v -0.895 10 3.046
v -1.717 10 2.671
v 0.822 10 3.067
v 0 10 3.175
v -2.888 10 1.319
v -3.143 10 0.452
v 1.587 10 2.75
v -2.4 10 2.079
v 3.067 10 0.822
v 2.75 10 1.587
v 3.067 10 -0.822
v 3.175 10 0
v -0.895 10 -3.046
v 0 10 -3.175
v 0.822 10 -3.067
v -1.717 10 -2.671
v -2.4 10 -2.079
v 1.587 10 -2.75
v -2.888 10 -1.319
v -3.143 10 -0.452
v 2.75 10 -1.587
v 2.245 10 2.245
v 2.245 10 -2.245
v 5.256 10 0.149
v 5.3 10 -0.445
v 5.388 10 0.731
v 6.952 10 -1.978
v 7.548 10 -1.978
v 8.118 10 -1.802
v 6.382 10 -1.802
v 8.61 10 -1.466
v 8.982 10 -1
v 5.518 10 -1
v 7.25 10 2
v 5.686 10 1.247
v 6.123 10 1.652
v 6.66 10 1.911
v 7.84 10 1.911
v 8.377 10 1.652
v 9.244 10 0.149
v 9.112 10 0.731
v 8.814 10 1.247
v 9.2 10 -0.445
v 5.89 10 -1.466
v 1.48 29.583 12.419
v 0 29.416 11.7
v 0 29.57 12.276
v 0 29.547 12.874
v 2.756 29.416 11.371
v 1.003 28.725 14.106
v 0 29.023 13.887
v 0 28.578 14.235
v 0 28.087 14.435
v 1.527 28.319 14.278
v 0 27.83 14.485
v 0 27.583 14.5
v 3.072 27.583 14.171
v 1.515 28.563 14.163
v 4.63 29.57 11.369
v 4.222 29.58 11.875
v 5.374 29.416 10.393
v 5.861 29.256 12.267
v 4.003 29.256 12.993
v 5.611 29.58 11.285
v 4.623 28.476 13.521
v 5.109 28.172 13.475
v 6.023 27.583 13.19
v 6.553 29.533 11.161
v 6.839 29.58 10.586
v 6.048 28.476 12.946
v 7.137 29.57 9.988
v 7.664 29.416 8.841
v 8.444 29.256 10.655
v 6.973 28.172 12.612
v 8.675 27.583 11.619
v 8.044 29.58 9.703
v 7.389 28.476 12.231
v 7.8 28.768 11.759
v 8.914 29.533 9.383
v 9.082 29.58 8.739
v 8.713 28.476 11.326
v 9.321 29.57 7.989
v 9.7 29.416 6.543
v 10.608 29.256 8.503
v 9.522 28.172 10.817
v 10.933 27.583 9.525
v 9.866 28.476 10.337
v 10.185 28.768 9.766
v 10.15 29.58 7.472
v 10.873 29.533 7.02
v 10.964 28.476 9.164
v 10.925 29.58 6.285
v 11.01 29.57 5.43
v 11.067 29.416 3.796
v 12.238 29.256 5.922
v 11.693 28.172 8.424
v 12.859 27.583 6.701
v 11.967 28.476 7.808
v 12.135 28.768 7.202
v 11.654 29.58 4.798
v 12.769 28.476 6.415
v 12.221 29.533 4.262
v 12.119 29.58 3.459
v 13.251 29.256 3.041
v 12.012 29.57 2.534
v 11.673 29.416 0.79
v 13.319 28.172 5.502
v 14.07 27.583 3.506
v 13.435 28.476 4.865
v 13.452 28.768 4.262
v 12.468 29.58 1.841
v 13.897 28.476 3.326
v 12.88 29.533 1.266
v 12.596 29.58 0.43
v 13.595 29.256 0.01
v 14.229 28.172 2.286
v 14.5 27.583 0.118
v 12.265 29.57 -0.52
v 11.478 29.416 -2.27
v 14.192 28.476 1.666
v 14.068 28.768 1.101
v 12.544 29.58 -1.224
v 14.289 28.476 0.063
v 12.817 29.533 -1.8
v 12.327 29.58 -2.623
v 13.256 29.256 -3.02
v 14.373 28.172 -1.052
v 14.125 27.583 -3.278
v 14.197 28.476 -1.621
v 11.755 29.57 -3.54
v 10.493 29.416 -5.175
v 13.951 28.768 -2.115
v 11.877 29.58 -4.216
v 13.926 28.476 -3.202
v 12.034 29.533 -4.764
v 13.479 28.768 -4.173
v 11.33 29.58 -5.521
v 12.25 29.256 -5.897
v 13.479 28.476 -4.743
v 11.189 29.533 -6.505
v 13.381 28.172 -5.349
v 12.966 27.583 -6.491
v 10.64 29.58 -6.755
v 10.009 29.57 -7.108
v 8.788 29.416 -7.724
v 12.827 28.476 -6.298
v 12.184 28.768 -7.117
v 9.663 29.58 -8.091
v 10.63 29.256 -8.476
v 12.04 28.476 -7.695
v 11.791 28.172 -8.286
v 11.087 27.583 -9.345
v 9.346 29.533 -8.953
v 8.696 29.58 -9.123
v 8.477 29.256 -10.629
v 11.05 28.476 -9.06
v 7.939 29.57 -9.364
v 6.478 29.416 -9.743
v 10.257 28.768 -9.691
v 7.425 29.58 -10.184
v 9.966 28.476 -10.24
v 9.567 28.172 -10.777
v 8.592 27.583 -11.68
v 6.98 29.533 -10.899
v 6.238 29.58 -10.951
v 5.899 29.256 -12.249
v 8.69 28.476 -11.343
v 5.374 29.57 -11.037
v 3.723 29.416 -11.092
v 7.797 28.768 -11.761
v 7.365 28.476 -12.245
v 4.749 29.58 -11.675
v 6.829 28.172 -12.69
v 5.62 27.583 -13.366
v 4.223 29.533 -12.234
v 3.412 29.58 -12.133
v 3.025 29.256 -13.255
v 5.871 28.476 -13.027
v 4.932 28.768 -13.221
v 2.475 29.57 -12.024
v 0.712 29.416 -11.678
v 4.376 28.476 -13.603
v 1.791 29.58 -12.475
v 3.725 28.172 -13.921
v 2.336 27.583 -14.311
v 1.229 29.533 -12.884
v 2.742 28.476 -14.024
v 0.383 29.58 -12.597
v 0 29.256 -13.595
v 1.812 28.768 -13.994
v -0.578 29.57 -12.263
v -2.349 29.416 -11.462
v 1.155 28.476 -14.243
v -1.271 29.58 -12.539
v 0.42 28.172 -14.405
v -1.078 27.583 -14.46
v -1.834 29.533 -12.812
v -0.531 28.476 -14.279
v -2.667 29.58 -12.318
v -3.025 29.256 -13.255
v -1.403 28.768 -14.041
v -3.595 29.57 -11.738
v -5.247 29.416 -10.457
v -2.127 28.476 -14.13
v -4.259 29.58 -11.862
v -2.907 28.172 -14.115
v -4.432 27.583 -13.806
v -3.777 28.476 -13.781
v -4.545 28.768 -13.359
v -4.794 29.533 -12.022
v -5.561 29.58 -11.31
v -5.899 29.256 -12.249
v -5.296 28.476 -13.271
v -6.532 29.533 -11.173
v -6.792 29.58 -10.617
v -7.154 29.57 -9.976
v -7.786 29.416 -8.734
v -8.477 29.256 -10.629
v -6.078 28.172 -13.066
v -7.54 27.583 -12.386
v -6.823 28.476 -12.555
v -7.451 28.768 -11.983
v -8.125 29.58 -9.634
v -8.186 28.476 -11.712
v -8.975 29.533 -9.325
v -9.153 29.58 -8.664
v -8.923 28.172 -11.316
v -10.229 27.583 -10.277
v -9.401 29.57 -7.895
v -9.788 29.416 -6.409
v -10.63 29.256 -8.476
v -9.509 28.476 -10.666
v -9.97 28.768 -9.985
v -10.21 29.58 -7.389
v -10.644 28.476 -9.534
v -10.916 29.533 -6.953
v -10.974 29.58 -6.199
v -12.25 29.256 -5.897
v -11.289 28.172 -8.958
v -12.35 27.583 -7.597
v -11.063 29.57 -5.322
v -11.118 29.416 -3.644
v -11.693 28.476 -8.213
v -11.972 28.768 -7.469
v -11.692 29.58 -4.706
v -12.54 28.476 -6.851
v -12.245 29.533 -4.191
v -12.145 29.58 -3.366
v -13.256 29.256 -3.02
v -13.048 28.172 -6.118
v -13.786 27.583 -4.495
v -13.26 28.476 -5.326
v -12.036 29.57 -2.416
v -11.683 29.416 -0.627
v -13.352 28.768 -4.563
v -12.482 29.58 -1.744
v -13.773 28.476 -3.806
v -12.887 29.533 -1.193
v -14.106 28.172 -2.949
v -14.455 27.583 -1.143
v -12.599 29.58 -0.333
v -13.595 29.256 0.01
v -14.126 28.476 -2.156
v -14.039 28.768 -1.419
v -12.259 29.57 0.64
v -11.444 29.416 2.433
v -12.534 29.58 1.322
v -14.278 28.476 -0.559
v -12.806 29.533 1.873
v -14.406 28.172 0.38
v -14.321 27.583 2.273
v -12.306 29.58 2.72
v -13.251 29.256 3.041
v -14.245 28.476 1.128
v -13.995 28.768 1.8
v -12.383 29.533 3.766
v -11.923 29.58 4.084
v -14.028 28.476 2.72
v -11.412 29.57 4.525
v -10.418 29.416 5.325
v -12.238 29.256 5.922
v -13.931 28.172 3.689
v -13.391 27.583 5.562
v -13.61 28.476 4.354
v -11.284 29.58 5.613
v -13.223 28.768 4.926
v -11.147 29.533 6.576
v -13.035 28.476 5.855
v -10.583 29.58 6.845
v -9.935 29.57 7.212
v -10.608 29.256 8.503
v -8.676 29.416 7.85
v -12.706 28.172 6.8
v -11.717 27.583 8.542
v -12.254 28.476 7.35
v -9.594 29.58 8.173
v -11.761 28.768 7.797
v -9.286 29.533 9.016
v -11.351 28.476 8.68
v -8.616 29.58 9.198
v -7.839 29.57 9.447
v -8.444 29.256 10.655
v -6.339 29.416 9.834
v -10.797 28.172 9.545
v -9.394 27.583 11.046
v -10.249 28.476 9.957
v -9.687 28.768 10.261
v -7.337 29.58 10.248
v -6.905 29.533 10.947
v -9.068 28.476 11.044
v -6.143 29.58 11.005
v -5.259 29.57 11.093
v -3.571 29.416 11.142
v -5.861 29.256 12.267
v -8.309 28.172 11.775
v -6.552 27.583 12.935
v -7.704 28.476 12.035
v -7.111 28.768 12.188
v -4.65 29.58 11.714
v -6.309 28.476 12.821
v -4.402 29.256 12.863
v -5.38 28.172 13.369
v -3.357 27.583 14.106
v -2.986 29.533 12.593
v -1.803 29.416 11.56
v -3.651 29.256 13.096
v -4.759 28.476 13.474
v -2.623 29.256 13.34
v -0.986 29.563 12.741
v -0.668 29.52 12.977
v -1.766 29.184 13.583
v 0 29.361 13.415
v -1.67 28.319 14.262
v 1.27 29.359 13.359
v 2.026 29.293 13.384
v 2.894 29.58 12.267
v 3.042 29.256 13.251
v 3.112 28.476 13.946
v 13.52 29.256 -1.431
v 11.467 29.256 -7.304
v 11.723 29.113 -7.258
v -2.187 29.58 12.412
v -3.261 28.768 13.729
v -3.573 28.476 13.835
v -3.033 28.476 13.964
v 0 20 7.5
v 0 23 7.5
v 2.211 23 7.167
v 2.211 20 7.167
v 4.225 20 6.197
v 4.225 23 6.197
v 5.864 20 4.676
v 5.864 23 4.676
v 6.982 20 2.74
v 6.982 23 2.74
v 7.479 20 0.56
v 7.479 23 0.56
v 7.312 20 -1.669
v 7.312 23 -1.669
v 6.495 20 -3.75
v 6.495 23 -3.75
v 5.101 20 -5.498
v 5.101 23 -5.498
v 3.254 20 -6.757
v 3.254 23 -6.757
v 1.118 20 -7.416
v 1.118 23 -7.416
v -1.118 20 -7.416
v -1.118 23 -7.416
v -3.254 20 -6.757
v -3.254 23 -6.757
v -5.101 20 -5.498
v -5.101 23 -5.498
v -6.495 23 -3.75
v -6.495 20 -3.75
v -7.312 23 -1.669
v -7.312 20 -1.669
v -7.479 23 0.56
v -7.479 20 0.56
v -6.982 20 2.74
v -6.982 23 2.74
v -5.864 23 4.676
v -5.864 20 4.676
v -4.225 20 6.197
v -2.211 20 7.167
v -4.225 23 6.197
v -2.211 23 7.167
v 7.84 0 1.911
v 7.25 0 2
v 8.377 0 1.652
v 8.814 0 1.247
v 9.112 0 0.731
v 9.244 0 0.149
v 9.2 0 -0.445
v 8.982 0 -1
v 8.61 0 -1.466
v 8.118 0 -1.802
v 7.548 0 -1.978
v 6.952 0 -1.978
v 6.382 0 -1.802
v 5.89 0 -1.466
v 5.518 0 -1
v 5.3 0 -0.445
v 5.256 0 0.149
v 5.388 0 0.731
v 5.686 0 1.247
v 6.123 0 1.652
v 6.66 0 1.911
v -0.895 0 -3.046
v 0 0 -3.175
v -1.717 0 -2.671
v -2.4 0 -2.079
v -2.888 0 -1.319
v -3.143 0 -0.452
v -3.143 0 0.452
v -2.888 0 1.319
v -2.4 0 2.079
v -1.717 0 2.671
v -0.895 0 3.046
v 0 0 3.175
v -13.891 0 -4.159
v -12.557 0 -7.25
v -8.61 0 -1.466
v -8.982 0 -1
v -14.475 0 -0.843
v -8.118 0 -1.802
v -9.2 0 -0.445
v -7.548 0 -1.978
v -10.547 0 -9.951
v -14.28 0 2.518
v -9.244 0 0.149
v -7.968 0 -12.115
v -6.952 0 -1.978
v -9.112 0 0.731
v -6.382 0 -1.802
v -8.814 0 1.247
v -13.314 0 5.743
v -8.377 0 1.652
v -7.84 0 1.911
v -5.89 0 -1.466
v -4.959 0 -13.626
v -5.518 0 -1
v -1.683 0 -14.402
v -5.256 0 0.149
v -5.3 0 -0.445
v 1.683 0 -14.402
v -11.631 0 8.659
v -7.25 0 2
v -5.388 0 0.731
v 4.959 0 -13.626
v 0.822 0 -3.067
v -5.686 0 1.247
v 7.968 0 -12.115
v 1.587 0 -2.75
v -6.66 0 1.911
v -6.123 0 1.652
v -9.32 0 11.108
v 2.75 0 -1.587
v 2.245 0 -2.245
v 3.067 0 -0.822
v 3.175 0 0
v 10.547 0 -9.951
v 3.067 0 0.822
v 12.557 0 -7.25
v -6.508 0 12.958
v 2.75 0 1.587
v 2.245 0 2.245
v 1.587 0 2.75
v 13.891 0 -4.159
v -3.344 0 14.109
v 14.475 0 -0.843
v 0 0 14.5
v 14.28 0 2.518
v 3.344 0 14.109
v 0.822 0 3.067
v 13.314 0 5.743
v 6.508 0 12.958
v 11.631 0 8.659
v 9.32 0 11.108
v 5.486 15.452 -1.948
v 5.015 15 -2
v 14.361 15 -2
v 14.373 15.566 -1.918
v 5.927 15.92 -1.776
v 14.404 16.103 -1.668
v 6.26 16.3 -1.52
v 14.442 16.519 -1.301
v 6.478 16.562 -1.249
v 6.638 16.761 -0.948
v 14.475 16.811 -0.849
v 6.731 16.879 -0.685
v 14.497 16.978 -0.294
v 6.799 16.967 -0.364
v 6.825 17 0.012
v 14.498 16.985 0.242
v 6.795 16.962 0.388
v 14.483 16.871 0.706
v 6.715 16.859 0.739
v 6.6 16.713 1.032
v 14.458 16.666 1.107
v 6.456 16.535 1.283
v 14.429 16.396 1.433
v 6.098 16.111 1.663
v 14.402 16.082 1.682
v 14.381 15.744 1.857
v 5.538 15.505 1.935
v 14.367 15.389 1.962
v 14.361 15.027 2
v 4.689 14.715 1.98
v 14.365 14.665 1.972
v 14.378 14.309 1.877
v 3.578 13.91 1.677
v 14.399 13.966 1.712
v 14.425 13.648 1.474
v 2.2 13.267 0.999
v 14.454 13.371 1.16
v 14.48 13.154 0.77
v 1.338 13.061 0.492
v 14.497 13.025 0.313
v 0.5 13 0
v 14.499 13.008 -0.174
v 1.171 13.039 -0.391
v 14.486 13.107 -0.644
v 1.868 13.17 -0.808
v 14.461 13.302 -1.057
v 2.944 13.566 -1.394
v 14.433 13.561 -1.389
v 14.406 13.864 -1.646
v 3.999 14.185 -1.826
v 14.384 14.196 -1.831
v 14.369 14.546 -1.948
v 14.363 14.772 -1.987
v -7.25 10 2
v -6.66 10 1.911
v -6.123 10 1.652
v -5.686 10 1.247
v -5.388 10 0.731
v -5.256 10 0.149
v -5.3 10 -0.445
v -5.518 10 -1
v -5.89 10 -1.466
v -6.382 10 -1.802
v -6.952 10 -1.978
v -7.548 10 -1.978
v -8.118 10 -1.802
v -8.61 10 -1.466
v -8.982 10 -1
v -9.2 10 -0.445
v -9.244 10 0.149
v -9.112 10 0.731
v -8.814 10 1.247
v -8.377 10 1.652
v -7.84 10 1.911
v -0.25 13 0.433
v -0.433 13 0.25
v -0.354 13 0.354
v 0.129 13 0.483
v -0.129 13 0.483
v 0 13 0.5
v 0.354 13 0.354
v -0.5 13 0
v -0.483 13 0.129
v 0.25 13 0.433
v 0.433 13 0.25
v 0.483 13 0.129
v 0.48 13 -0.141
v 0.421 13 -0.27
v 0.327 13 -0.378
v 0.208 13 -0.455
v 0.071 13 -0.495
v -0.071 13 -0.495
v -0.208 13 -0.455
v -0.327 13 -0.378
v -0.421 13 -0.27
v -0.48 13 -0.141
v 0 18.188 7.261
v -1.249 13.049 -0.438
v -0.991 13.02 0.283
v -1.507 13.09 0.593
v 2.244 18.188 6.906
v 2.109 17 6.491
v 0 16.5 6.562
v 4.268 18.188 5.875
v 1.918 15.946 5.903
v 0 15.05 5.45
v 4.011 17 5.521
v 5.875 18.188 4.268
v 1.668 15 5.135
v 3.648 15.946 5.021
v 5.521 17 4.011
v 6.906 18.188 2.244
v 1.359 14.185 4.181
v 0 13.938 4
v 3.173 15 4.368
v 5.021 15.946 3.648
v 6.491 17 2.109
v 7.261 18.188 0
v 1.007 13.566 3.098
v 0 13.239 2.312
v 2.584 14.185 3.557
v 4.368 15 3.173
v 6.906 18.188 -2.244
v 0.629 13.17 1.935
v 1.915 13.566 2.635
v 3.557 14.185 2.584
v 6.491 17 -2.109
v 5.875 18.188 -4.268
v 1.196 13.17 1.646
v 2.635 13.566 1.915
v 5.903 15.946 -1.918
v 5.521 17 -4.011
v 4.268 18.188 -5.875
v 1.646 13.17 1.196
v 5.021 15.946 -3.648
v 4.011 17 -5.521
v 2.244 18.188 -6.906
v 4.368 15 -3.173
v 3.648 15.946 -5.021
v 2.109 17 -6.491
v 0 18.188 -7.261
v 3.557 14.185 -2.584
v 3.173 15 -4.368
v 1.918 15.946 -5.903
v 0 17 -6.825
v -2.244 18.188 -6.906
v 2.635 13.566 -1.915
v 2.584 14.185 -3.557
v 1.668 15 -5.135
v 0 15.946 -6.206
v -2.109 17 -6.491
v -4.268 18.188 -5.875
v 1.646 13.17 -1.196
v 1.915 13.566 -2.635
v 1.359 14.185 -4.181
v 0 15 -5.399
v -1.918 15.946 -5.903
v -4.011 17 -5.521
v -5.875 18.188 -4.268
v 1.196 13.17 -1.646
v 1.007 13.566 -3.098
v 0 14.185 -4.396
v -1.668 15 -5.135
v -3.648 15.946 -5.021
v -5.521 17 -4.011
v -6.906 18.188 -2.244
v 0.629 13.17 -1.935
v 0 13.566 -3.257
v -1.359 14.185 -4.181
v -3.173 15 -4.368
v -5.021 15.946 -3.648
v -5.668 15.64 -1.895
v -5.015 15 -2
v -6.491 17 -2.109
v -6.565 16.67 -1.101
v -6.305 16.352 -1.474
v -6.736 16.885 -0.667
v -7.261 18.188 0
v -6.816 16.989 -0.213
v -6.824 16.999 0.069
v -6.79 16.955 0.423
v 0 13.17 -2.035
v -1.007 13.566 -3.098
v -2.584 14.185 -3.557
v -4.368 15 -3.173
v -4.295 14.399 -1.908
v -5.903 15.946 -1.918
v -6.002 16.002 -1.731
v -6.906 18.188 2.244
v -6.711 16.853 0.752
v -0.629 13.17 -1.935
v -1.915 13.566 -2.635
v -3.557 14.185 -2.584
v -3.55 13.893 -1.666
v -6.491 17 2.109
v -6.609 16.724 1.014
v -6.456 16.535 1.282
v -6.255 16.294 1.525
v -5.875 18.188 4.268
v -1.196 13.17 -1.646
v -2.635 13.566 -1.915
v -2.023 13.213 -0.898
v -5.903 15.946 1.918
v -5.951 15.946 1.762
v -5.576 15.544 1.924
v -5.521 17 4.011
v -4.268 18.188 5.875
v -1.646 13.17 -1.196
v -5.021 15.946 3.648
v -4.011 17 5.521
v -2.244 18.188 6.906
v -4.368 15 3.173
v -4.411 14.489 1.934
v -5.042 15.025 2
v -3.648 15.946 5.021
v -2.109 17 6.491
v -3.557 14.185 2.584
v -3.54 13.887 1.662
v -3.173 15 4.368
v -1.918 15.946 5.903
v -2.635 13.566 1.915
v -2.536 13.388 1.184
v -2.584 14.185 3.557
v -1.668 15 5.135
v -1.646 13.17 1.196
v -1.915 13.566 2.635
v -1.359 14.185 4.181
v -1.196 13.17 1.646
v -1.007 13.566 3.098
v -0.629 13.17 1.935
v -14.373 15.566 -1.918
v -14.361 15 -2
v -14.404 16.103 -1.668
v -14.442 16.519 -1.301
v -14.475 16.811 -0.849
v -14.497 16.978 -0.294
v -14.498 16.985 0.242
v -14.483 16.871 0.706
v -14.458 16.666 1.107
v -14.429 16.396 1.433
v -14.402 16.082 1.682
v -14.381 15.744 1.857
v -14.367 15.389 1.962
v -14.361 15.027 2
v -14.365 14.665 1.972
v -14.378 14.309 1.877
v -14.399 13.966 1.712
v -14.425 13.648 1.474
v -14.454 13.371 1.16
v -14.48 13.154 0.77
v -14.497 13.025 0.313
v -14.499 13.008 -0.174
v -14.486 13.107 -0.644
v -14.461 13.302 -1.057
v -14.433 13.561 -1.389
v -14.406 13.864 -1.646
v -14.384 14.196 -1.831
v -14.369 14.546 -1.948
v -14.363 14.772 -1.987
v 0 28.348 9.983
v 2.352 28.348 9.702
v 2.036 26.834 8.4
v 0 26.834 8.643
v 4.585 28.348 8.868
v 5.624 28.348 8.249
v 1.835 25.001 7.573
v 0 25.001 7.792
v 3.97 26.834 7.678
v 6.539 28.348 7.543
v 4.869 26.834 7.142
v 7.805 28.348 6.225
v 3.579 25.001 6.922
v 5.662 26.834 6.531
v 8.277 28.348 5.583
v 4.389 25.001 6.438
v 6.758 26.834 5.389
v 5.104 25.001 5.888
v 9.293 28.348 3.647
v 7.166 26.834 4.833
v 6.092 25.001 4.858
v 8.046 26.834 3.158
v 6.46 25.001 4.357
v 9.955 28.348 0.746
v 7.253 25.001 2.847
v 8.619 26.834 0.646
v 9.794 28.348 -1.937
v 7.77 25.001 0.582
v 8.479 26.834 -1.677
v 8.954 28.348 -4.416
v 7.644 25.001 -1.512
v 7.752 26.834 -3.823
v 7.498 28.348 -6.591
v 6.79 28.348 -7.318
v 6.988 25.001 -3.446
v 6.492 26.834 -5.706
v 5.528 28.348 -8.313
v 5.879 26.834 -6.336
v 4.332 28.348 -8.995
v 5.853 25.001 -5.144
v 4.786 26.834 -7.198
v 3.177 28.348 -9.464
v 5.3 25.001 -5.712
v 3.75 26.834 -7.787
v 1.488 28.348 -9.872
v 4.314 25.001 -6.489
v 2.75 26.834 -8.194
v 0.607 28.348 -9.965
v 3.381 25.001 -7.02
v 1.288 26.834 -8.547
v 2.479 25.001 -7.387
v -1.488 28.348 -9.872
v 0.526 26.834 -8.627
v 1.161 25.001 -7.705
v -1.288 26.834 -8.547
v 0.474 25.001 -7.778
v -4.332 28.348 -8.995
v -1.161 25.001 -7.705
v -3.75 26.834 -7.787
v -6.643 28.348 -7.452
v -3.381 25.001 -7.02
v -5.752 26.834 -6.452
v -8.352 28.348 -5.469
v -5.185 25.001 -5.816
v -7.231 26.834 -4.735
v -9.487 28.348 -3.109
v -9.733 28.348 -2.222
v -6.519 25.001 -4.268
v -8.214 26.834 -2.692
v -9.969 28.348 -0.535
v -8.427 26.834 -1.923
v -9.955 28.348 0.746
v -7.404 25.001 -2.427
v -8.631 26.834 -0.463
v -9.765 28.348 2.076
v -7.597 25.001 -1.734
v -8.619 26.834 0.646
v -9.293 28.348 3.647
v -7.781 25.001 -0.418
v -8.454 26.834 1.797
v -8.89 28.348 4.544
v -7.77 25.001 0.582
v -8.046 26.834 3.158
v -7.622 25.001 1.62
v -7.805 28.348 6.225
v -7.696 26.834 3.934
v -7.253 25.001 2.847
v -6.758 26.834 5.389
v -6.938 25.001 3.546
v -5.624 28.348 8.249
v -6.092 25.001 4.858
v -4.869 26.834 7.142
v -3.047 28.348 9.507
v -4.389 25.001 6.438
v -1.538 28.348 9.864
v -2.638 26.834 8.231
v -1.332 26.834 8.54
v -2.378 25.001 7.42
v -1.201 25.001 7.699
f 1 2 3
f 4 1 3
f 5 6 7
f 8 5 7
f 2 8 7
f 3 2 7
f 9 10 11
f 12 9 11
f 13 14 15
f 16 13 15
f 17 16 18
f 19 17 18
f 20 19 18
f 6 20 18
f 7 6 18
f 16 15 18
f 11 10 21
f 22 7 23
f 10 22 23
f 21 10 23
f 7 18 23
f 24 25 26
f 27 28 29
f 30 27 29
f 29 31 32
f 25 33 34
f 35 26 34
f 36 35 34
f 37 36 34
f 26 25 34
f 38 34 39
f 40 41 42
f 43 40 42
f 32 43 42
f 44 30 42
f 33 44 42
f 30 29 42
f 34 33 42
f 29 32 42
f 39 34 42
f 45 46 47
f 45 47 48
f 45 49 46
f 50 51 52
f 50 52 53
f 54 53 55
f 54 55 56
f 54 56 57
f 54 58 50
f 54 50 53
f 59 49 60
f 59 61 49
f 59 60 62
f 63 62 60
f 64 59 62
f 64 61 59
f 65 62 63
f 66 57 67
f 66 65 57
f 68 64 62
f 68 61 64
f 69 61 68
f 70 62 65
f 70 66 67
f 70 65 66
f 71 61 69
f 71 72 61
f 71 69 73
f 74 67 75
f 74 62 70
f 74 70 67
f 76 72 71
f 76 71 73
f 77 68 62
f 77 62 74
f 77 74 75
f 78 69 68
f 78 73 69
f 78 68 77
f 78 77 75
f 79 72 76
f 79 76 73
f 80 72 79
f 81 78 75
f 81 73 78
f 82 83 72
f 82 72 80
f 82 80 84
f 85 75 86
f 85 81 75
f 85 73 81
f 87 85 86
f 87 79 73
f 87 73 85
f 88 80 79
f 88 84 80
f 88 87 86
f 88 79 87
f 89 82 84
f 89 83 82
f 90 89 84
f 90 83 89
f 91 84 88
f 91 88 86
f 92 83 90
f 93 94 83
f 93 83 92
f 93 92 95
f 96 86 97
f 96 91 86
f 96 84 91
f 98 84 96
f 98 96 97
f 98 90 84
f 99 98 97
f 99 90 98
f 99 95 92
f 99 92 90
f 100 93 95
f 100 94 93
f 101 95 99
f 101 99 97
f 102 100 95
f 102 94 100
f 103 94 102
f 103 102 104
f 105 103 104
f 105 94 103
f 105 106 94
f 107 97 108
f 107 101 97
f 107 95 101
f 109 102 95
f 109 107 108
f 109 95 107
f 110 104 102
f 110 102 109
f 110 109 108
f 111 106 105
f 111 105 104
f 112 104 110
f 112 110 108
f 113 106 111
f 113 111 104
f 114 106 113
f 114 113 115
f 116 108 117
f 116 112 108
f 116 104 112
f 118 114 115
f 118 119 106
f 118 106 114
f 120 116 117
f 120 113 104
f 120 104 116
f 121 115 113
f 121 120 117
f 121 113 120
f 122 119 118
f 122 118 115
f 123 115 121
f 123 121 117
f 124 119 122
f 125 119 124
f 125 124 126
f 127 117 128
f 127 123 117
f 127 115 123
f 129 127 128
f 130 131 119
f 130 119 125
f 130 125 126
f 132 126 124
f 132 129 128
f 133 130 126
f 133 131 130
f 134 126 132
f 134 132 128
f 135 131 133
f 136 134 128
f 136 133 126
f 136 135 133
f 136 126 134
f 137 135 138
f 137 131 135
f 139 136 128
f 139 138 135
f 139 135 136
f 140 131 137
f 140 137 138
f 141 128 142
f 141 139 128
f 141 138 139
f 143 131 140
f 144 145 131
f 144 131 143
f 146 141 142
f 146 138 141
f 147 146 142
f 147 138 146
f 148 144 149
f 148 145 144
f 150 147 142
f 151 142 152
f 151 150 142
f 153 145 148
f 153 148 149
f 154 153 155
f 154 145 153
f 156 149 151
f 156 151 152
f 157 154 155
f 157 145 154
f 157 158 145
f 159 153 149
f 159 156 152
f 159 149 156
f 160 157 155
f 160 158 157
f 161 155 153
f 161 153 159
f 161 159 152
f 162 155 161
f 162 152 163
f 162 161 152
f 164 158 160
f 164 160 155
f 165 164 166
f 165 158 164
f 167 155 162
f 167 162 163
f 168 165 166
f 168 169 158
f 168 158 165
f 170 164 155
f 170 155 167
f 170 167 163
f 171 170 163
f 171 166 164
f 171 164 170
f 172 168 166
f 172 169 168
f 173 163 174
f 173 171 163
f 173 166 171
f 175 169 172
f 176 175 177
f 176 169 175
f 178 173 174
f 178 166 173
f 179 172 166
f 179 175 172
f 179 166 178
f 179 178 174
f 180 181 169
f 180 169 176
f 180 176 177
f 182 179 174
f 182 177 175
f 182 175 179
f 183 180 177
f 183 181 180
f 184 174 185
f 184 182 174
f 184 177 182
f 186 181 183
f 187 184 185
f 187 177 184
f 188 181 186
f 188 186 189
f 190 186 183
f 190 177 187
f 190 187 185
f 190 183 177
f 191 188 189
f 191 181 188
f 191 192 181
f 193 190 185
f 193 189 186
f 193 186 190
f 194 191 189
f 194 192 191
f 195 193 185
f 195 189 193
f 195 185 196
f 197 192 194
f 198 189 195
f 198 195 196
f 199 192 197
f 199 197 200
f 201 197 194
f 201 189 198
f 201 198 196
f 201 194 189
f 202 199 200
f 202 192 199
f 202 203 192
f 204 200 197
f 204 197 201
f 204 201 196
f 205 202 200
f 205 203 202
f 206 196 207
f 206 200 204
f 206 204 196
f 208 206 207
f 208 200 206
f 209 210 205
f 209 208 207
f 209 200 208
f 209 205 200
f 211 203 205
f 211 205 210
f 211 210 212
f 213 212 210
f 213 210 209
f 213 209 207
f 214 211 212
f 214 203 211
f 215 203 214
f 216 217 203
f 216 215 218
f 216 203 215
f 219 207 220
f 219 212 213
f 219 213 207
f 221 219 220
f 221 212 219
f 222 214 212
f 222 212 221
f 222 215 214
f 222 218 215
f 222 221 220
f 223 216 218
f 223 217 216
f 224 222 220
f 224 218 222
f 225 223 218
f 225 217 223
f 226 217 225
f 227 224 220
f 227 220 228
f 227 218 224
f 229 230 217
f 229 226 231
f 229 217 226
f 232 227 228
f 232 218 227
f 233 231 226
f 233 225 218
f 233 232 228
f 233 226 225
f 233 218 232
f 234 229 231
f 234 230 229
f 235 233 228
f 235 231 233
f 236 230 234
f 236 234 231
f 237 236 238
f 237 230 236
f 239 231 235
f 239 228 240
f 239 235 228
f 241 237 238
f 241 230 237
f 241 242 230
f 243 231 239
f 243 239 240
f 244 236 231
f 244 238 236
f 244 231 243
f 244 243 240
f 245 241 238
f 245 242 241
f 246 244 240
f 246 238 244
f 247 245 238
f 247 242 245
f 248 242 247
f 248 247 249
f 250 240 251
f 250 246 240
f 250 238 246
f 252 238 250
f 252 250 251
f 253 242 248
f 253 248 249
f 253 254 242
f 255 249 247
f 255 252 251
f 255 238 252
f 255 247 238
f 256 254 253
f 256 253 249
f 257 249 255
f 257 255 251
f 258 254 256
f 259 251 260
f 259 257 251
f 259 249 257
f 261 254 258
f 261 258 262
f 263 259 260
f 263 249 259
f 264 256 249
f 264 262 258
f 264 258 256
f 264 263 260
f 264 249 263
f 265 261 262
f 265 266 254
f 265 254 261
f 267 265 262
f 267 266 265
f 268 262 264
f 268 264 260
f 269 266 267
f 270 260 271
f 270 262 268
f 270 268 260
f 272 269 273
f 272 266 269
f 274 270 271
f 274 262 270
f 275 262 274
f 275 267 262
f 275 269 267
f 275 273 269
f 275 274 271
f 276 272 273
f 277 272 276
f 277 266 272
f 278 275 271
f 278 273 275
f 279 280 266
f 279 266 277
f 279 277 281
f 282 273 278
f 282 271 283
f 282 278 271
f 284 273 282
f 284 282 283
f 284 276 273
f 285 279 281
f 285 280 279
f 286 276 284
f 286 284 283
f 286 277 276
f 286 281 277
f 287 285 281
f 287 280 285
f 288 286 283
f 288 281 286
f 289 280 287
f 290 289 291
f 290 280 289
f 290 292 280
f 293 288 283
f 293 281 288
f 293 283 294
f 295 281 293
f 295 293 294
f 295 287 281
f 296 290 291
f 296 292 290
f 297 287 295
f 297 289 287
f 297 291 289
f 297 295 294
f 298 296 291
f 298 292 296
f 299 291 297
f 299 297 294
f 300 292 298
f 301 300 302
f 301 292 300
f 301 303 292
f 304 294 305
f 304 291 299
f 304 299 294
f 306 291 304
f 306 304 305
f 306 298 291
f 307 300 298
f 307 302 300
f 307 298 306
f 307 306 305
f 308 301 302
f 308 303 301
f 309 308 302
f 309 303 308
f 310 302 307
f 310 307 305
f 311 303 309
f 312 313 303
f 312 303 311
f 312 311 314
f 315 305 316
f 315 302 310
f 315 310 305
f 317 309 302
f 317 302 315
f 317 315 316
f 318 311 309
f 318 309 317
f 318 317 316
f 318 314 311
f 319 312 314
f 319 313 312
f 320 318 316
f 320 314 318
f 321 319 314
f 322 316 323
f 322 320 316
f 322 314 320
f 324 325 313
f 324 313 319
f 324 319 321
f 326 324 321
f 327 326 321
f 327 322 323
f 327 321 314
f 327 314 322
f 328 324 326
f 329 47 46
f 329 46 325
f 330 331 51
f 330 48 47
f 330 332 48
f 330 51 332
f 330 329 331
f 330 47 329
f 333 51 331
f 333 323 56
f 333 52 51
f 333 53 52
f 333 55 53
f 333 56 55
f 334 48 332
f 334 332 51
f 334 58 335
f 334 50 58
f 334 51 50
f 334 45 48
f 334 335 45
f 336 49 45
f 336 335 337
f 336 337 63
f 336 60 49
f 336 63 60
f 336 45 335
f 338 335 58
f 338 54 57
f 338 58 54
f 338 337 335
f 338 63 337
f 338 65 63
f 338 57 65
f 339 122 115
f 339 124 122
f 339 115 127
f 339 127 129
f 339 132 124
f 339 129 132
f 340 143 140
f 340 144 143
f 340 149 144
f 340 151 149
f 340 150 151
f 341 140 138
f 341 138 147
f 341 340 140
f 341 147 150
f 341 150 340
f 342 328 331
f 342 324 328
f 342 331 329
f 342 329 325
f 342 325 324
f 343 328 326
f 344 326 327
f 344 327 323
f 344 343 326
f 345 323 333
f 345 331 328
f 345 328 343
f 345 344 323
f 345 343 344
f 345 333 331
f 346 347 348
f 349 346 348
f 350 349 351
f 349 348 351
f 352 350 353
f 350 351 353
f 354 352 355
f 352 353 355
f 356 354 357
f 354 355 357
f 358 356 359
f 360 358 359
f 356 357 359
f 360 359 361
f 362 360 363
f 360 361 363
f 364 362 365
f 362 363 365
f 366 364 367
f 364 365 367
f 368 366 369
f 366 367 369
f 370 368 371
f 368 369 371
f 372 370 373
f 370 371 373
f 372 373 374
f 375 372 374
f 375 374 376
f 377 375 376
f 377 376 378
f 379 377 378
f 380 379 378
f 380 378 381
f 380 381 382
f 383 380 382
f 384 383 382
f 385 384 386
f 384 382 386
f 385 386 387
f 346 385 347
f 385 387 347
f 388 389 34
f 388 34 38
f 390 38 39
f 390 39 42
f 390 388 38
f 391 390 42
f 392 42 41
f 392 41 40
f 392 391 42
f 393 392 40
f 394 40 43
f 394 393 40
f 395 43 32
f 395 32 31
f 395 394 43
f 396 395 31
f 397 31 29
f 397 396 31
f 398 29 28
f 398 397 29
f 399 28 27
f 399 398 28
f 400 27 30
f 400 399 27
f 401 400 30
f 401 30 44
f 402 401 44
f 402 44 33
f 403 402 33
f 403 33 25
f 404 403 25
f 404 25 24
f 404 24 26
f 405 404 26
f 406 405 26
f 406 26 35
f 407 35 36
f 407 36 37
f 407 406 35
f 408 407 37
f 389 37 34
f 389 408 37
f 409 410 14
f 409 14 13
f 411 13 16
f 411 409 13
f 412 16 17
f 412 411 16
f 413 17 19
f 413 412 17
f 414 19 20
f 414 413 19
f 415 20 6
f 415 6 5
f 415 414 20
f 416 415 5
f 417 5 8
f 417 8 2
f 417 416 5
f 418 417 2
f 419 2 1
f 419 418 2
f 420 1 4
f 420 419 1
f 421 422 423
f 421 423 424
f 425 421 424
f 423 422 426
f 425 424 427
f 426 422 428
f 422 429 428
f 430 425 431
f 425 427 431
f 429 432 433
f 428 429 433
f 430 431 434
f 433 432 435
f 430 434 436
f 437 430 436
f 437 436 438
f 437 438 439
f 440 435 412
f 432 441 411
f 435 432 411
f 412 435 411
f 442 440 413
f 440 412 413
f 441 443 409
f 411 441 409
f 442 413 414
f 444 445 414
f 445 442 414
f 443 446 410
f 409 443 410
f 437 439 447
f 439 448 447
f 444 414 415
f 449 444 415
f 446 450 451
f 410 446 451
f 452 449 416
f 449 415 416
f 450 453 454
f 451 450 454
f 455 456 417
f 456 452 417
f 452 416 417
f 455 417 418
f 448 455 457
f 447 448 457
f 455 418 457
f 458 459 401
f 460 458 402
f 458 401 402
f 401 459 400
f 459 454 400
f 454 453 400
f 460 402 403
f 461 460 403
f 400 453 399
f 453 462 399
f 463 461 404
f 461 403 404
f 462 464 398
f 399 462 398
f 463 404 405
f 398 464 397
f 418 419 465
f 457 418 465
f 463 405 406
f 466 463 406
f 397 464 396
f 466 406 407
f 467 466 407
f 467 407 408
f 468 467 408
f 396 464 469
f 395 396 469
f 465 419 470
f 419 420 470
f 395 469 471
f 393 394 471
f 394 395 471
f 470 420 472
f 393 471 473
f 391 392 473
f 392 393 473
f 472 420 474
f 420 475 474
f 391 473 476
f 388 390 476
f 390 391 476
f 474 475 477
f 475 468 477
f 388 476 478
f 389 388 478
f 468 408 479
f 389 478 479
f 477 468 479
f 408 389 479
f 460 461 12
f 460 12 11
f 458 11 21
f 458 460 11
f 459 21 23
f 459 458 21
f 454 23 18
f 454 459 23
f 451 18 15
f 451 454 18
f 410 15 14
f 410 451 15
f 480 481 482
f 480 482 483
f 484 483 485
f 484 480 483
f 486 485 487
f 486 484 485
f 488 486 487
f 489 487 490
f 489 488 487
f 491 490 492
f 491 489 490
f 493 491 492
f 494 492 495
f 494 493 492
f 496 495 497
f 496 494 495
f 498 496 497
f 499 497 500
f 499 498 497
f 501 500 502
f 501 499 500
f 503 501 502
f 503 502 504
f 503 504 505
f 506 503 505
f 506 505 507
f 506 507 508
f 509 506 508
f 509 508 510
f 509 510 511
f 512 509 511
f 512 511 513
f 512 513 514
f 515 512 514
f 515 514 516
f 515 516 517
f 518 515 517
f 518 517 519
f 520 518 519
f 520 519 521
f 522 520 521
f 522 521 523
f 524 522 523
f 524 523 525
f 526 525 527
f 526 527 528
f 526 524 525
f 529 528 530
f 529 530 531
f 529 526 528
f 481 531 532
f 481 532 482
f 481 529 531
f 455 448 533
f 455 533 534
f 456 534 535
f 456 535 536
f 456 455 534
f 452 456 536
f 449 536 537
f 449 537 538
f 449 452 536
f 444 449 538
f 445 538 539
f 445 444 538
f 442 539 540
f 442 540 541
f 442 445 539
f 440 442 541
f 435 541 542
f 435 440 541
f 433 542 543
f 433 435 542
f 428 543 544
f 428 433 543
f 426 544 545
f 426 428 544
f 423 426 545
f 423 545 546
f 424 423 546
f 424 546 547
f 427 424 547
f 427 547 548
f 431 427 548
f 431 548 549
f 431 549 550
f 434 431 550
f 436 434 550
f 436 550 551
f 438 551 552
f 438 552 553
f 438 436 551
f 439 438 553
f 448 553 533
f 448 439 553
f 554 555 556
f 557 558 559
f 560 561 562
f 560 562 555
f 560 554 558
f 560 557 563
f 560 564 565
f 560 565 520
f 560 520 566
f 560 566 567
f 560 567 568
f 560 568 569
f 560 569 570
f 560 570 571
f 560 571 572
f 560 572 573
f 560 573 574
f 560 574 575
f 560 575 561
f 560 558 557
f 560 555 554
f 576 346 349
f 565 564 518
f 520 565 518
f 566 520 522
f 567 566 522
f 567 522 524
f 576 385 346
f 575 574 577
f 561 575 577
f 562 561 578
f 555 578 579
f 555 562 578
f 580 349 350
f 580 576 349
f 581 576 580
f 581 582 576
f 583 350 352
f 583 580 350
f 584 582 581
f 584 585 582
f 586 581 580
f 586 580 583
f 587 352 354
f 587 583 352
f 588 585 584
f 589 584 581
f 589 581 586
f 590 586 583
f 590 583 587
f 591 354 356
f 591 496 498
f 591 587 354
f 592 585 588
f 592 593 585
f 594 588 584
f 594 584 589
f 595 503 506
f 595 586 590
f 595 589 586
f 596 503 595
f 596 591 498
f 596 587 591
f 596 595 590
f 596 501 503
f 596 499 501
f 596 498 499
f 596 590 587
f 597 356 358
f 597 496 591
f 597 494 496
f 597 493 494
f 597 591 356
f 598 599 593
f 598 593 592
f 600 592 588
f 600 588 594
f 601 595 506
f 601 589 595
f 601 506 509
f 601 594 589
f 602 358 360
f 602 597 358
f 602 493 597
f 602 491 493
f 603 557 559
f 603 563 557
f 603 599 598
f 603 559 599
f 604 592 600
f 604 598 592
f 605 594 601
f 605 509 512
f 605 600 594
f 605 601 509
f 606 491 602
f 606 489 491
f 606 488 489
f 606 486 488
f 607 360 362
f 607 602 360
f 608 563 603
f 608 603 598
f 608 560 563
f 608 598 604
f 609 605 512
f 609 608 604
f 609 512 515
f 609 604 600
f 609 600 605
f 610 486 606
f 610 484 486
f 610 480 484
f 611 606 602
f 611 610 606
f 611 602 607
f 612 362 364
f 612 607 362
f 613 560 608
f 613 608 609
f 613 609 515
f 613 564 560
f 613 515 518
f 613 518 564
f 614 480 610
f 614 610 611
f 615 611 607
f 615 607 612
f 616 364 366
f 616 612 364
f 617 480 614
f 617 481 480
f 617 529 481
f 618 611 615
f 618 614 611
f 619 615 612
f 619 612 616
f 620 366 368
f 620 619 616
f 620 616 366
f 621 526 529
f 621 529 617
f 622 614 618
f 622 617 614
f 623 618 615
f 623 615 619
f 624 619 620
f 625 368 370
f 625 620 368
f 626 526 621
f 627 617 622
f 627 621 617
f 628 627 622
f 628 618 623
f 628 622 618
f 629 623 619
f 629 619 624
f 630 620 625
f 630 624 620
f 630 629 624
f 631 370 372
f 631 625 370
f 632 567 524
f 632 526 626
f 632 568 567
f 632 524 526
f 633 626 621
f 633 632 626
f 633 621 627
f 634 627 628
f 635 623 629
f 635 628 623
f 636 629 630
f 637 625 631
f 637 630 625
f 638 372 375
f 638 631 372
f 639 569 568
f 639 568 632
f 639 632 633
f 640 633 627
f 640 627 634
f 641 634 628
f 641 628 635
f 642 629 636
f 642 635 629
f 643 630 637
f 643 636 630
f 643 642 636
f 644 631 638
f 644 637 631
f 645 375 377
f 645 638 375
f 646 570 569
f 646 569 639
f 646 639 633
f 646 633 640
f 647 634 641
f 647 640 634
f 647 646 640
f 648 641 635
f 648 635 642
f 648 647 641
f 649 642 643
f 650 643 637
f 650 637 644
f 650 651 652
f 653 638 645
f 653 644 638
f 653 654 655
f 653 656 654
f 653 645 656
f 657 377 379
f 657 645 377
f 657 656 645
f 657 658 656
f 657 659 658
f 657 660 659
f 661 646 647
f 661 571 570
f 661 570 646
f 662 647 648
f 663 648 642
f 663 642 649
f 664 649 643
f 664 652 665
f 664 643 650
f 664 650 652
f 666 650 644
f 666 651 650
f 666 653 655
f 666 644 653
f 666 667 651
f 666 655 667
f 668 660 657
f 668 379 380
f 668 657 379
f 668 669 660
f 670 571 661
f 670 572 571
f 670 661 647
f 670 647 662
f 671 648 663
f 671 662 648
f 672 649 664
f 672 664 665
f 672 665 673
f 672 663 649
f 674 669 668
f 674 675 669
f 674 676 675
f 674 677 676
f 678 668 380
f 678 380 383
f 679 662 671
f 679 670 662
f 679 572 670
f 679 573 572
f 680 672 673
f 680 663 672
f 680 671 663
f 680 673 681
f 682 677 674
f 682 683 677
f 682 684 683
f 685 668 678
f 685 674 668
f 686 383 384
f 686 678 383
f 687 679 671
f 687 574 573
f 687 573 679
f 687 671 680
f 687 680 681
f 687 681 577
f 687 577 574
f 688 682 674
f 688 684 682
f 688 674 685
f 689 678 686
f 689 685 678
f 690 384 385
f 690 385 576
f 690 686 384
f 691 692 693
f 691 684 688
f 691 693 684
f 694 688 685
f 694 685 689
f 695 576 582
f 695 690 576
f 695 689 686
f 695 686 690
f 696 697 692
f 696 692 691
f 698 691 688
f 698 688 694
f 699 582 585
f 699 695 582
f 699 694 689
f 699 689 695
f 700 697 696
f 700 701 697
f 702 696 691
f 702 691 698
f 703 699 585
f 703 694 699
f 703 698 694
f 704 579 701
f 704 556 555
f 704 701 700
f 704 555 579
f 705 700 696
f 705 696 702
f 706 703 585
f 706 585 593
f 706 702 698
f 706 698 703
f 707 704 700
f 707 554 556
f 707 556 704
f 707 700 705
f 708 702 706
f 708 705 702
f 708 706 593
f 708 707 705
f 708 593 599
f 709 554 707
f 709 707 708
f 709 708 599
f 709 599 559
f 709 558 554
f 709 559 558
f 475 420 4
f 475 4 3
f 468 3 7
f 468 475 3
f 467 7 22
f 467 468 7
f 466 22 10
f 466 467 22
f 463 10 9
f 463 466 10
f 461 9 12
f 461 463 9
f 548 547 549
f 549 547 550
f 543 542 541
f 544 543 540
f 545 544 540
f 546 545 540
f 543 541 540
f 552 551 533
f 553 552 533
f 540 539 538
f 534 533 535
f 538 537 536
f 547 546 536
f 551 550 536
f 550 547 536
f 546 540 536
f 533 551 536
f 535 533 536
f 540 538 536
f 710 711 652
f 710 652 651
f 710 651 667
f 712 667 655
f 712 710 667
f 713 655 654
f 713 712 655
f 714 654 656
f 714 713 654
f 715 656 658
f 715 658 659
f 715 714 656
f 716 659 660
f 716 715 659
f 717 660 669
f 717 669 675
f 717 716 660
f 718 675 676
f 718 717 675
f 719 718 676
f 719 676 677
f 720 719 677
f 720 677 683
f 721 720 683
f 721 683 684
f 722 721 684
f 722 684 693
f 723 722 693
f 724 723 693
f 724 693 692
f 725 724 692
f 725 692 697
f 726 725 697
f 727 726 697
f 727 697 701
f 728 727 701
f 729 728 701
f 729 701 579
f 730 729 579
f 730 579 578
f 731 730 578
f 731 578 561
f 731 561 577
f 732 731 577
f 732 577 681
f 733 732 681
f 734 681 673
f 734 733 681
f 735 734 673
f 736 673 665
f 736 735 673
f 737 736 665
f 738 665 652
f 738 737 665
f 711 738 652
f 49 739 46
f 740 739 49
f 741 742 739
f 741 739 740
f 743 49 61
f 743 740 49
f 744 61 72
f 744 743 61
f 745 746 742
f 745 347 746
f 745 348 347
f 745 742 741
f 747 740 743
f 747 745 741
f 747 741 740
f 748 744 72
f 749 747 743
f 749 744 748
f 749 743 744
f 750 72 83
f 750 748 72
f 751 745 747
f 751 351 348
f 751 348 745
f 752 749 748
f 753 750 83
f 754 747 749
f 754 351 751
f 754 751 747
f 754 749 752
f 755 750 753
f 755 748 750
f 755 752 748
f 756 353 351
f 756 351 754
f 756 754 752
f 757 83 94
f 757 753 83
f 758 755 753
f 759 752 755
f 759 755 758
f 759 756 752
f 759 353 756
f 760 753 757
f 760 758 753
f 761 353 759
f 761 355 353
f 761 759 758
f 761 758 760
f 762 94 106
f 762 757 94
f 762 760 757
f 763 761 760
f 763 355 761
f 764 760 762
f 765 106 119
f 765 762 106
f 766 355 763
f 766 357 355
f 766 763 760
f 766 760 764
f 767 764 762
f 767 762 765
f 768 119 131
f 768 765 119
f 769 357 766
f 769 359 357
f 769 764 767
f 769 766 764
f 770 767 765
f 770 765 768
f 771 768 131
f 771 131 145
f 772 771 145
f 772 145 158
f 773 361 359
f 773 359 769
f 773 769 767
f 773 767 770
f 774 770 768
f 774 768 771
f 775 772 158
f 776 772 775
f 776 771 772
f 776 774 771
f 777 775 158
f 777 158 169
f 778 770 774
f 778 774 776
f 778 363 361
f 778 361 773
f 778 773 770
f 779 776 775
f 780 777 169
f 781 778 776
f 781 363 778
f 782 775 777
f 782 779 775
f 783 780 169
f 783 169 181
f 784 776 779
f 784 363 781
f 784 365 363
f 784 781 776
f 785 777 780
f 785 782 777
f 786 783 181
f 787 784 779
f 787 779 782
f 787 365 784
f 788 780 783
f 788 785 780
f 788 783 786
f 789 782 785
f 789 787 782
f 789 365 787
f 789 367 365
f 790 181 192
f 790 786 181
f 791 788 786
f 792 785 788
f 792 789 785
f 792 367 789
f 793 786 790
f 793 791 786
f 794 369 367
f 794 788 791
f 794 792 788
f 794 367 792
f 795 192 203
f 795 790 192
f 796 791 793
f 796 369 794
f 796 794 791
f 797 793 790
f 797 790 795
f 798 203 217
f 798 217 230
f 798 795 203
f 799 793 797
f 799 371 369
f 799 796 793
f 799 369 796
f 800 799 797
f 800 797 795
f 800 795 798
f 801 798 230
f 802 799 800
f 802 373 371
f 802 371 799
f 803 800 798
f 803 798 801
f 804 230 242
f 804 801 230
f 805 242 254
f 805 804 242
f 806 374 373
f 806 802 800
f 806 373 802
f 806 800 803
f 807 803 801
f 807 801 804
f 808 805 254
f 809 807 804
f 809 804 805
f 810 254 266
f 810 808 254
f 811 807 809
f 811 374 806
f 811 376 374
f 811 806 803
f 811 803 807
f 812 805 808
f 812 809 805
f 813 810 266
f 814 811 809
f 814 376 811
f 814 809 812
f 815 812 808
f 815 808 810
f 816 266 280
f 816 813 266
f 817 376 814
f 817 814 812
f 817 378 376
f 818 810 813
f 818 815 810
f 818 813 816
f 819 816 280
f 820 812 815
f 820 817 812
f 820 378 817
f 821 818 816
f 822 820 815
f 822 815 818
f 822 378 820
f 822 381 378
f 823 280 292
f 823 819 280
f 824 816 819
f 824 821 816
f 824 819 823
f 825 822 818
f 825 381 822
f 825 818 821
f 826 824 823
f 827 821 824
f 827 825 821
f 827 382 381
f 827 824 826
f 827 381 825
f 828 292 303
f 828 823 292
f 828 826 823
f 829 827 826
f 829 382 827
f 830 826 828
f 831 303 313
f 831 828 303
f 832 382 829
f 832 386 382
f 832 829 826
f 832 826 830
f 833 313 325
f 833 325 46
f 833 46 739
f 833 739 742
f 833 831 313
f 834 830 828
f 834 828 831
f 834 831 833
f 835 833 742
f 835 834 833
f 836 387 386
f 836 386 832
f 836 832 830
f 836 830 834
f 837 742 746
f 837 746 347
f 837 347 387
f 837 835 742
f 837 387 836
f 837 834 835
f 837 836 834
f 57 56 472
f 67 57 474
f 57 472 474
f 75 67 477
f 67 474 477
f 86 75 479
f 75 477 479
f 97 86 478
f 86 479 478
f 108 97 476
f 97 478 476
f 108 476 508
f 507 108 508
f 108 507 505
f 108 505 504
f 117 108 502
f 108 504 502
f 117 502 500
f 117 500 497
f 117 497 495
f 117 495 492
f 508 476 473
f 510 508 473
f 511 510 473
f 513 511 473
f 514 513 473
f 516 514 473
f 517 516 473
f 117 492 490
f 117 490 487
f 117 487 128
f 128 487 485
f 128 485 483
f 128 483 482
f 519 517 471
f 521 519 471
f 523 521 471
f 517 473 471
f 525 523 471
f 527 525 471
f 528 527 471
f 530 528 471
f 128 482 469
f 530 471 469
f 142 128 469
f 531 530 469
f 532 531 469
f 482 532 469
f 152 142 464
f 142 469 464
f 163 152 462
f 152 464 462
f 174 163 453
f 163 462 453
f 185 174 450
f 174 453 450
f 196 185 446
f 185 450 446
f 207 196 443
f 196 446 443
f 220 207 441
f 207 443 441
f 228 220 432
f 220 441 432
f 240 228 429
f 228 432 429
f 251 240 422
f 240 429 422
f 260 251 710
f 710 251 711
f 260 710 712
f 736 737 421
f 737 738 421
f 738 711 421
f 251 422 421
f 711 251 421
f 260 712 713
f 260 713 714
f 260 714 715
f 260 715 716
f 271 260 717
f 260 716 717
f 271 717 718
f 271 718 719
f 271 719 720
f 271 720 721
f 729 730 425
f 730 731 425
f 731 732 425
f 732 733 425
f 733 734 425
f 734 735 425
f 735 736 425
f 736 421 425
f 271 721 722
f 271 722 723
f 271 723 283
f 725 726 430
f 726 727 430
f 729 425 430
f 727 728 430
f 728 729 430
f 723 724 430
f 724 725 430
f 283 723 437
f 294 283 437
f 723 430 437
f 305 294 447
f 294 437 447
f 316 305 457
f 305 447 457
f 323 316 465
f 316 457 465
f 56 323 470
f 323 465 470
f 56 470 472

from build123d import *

# Parameters (mm, degrees)
ESBO_O1_R                  = 14.5
RESSALTO_EXTRUS_O1_DEPTH   = 30
ESBO_O3_R                  = 7.5
CORTE_EXTRUS_O3_DEPTH      = 17
FILETE1_R                  = 7
FILETE2_R                  = 2
CORTE_EXTRUS_O1_DEPTH      = 36.994872408
CORTE_EXTRUS_O1_DEPTH_BACK = 36.994872408
ESBO_O2_R                  = 2
ESBO_O1_3_R                = 2
CORTE_EXTRUS_O2_DEPTH      = 10


with BuildPart() as part:
    # Esboço1 → Ressalto-extrusão1 (new body)
    with BuildSketch(Plane(origin=(0, 0, 0), x_dir=(1, 0, 0), z_dir=(0, 1, 0))):
        with Locations(Location((0, 0, 0), (0, 0, 270))):
            Circle(ESBO_O1_R)
    extrude(amount=RESSALTO_EXTRUS_O1_DEPTH)

    # Esboço3 → Corte-extrusão3 (cut)
    with BuildSketch(Plane(origin=(0, 30, 0), x_dir=(1, 0, 0), z_dir=(0, 1, 0))):
        with Locations(Location((0, 0, 0), (0, 0, 270))):
            Circle(ESBO_O3_R)
    extrude(amount=-CORTE_EXTRUS_O3_DEPTH, mode=Mode.SUBTRACT)

    # Filete1
    filete1_edges = [part.edges().sort_by_distance(p)[0] for p in [
        (0, 13, -7.5),
        (0, 30, -7.5),
    ]]
    fillet(filete1_edges, radius=FILETE1_R - 0.0001)  # a hair under: the kernel refuses the full size

    # Filete2
    filete2_edges = [part.edges().sort_by_distance(p)[0] for p in [
        (0, 30, -14.5),
    ]]
    fillet(filete2_edges, radius=FILETE2_R)

    # Esboço2 → Corte-extrusão1 (cut, two sides: drawn at the far end of the back side and taken through both)
    with BuildSketch(Plane(origin=(0, 0, 0), x_dir=(0, 0, -1), z_dir=(1, 0, 0)).offset(-CORTE_EXTRUS_O1_DEPTH_BACK)):
        with Locations((0, 15)):
            Circle(ESBO_O2_R)
    extrude(amount=CORTE_EXTRUS_O1_DEPTH + CORTE_EXTRUS_O1_DEPTH_BACK, mode=Mode.SUBTRACT)

    # Esboço1<3> → Corte-extrusão2 (cut)
    with BuildSketch(Plane(origin=(0, 0, 0), x_dir=(1, 0, 0), z_dir=(0, 1, 0))):
        with Locations(Location((-7.25, 0, 0), (0, 0, 270))):
            Circle(ESBO_O1_3_R)
        with BuildLine():
            ThreePointArc((3.175, 0), (2.24506403, 2.24506403), (0, 3.175))
            Line((0, 3.175), (0, -3.175))
            ThreePointArc((0, -3.175), (2.24506403, -2.24506403), (3.175, 0))
        make_face()
        with BuildLine():
            Line((0, -3.175), (0, 3.175))
            ThreePointArc((0, 3.175), (-3.175, 0), (0, -3.175))
        make_face()
        with Locations(Location((7.25, 0, 0), (0, 0, 270))):
            Circle(ESBO_O1_3_R)
    extrude(amount=CORTE_EXTRUS_O2_DEPTH, mode=Mode.SUBTRACT)


solid = part.part
